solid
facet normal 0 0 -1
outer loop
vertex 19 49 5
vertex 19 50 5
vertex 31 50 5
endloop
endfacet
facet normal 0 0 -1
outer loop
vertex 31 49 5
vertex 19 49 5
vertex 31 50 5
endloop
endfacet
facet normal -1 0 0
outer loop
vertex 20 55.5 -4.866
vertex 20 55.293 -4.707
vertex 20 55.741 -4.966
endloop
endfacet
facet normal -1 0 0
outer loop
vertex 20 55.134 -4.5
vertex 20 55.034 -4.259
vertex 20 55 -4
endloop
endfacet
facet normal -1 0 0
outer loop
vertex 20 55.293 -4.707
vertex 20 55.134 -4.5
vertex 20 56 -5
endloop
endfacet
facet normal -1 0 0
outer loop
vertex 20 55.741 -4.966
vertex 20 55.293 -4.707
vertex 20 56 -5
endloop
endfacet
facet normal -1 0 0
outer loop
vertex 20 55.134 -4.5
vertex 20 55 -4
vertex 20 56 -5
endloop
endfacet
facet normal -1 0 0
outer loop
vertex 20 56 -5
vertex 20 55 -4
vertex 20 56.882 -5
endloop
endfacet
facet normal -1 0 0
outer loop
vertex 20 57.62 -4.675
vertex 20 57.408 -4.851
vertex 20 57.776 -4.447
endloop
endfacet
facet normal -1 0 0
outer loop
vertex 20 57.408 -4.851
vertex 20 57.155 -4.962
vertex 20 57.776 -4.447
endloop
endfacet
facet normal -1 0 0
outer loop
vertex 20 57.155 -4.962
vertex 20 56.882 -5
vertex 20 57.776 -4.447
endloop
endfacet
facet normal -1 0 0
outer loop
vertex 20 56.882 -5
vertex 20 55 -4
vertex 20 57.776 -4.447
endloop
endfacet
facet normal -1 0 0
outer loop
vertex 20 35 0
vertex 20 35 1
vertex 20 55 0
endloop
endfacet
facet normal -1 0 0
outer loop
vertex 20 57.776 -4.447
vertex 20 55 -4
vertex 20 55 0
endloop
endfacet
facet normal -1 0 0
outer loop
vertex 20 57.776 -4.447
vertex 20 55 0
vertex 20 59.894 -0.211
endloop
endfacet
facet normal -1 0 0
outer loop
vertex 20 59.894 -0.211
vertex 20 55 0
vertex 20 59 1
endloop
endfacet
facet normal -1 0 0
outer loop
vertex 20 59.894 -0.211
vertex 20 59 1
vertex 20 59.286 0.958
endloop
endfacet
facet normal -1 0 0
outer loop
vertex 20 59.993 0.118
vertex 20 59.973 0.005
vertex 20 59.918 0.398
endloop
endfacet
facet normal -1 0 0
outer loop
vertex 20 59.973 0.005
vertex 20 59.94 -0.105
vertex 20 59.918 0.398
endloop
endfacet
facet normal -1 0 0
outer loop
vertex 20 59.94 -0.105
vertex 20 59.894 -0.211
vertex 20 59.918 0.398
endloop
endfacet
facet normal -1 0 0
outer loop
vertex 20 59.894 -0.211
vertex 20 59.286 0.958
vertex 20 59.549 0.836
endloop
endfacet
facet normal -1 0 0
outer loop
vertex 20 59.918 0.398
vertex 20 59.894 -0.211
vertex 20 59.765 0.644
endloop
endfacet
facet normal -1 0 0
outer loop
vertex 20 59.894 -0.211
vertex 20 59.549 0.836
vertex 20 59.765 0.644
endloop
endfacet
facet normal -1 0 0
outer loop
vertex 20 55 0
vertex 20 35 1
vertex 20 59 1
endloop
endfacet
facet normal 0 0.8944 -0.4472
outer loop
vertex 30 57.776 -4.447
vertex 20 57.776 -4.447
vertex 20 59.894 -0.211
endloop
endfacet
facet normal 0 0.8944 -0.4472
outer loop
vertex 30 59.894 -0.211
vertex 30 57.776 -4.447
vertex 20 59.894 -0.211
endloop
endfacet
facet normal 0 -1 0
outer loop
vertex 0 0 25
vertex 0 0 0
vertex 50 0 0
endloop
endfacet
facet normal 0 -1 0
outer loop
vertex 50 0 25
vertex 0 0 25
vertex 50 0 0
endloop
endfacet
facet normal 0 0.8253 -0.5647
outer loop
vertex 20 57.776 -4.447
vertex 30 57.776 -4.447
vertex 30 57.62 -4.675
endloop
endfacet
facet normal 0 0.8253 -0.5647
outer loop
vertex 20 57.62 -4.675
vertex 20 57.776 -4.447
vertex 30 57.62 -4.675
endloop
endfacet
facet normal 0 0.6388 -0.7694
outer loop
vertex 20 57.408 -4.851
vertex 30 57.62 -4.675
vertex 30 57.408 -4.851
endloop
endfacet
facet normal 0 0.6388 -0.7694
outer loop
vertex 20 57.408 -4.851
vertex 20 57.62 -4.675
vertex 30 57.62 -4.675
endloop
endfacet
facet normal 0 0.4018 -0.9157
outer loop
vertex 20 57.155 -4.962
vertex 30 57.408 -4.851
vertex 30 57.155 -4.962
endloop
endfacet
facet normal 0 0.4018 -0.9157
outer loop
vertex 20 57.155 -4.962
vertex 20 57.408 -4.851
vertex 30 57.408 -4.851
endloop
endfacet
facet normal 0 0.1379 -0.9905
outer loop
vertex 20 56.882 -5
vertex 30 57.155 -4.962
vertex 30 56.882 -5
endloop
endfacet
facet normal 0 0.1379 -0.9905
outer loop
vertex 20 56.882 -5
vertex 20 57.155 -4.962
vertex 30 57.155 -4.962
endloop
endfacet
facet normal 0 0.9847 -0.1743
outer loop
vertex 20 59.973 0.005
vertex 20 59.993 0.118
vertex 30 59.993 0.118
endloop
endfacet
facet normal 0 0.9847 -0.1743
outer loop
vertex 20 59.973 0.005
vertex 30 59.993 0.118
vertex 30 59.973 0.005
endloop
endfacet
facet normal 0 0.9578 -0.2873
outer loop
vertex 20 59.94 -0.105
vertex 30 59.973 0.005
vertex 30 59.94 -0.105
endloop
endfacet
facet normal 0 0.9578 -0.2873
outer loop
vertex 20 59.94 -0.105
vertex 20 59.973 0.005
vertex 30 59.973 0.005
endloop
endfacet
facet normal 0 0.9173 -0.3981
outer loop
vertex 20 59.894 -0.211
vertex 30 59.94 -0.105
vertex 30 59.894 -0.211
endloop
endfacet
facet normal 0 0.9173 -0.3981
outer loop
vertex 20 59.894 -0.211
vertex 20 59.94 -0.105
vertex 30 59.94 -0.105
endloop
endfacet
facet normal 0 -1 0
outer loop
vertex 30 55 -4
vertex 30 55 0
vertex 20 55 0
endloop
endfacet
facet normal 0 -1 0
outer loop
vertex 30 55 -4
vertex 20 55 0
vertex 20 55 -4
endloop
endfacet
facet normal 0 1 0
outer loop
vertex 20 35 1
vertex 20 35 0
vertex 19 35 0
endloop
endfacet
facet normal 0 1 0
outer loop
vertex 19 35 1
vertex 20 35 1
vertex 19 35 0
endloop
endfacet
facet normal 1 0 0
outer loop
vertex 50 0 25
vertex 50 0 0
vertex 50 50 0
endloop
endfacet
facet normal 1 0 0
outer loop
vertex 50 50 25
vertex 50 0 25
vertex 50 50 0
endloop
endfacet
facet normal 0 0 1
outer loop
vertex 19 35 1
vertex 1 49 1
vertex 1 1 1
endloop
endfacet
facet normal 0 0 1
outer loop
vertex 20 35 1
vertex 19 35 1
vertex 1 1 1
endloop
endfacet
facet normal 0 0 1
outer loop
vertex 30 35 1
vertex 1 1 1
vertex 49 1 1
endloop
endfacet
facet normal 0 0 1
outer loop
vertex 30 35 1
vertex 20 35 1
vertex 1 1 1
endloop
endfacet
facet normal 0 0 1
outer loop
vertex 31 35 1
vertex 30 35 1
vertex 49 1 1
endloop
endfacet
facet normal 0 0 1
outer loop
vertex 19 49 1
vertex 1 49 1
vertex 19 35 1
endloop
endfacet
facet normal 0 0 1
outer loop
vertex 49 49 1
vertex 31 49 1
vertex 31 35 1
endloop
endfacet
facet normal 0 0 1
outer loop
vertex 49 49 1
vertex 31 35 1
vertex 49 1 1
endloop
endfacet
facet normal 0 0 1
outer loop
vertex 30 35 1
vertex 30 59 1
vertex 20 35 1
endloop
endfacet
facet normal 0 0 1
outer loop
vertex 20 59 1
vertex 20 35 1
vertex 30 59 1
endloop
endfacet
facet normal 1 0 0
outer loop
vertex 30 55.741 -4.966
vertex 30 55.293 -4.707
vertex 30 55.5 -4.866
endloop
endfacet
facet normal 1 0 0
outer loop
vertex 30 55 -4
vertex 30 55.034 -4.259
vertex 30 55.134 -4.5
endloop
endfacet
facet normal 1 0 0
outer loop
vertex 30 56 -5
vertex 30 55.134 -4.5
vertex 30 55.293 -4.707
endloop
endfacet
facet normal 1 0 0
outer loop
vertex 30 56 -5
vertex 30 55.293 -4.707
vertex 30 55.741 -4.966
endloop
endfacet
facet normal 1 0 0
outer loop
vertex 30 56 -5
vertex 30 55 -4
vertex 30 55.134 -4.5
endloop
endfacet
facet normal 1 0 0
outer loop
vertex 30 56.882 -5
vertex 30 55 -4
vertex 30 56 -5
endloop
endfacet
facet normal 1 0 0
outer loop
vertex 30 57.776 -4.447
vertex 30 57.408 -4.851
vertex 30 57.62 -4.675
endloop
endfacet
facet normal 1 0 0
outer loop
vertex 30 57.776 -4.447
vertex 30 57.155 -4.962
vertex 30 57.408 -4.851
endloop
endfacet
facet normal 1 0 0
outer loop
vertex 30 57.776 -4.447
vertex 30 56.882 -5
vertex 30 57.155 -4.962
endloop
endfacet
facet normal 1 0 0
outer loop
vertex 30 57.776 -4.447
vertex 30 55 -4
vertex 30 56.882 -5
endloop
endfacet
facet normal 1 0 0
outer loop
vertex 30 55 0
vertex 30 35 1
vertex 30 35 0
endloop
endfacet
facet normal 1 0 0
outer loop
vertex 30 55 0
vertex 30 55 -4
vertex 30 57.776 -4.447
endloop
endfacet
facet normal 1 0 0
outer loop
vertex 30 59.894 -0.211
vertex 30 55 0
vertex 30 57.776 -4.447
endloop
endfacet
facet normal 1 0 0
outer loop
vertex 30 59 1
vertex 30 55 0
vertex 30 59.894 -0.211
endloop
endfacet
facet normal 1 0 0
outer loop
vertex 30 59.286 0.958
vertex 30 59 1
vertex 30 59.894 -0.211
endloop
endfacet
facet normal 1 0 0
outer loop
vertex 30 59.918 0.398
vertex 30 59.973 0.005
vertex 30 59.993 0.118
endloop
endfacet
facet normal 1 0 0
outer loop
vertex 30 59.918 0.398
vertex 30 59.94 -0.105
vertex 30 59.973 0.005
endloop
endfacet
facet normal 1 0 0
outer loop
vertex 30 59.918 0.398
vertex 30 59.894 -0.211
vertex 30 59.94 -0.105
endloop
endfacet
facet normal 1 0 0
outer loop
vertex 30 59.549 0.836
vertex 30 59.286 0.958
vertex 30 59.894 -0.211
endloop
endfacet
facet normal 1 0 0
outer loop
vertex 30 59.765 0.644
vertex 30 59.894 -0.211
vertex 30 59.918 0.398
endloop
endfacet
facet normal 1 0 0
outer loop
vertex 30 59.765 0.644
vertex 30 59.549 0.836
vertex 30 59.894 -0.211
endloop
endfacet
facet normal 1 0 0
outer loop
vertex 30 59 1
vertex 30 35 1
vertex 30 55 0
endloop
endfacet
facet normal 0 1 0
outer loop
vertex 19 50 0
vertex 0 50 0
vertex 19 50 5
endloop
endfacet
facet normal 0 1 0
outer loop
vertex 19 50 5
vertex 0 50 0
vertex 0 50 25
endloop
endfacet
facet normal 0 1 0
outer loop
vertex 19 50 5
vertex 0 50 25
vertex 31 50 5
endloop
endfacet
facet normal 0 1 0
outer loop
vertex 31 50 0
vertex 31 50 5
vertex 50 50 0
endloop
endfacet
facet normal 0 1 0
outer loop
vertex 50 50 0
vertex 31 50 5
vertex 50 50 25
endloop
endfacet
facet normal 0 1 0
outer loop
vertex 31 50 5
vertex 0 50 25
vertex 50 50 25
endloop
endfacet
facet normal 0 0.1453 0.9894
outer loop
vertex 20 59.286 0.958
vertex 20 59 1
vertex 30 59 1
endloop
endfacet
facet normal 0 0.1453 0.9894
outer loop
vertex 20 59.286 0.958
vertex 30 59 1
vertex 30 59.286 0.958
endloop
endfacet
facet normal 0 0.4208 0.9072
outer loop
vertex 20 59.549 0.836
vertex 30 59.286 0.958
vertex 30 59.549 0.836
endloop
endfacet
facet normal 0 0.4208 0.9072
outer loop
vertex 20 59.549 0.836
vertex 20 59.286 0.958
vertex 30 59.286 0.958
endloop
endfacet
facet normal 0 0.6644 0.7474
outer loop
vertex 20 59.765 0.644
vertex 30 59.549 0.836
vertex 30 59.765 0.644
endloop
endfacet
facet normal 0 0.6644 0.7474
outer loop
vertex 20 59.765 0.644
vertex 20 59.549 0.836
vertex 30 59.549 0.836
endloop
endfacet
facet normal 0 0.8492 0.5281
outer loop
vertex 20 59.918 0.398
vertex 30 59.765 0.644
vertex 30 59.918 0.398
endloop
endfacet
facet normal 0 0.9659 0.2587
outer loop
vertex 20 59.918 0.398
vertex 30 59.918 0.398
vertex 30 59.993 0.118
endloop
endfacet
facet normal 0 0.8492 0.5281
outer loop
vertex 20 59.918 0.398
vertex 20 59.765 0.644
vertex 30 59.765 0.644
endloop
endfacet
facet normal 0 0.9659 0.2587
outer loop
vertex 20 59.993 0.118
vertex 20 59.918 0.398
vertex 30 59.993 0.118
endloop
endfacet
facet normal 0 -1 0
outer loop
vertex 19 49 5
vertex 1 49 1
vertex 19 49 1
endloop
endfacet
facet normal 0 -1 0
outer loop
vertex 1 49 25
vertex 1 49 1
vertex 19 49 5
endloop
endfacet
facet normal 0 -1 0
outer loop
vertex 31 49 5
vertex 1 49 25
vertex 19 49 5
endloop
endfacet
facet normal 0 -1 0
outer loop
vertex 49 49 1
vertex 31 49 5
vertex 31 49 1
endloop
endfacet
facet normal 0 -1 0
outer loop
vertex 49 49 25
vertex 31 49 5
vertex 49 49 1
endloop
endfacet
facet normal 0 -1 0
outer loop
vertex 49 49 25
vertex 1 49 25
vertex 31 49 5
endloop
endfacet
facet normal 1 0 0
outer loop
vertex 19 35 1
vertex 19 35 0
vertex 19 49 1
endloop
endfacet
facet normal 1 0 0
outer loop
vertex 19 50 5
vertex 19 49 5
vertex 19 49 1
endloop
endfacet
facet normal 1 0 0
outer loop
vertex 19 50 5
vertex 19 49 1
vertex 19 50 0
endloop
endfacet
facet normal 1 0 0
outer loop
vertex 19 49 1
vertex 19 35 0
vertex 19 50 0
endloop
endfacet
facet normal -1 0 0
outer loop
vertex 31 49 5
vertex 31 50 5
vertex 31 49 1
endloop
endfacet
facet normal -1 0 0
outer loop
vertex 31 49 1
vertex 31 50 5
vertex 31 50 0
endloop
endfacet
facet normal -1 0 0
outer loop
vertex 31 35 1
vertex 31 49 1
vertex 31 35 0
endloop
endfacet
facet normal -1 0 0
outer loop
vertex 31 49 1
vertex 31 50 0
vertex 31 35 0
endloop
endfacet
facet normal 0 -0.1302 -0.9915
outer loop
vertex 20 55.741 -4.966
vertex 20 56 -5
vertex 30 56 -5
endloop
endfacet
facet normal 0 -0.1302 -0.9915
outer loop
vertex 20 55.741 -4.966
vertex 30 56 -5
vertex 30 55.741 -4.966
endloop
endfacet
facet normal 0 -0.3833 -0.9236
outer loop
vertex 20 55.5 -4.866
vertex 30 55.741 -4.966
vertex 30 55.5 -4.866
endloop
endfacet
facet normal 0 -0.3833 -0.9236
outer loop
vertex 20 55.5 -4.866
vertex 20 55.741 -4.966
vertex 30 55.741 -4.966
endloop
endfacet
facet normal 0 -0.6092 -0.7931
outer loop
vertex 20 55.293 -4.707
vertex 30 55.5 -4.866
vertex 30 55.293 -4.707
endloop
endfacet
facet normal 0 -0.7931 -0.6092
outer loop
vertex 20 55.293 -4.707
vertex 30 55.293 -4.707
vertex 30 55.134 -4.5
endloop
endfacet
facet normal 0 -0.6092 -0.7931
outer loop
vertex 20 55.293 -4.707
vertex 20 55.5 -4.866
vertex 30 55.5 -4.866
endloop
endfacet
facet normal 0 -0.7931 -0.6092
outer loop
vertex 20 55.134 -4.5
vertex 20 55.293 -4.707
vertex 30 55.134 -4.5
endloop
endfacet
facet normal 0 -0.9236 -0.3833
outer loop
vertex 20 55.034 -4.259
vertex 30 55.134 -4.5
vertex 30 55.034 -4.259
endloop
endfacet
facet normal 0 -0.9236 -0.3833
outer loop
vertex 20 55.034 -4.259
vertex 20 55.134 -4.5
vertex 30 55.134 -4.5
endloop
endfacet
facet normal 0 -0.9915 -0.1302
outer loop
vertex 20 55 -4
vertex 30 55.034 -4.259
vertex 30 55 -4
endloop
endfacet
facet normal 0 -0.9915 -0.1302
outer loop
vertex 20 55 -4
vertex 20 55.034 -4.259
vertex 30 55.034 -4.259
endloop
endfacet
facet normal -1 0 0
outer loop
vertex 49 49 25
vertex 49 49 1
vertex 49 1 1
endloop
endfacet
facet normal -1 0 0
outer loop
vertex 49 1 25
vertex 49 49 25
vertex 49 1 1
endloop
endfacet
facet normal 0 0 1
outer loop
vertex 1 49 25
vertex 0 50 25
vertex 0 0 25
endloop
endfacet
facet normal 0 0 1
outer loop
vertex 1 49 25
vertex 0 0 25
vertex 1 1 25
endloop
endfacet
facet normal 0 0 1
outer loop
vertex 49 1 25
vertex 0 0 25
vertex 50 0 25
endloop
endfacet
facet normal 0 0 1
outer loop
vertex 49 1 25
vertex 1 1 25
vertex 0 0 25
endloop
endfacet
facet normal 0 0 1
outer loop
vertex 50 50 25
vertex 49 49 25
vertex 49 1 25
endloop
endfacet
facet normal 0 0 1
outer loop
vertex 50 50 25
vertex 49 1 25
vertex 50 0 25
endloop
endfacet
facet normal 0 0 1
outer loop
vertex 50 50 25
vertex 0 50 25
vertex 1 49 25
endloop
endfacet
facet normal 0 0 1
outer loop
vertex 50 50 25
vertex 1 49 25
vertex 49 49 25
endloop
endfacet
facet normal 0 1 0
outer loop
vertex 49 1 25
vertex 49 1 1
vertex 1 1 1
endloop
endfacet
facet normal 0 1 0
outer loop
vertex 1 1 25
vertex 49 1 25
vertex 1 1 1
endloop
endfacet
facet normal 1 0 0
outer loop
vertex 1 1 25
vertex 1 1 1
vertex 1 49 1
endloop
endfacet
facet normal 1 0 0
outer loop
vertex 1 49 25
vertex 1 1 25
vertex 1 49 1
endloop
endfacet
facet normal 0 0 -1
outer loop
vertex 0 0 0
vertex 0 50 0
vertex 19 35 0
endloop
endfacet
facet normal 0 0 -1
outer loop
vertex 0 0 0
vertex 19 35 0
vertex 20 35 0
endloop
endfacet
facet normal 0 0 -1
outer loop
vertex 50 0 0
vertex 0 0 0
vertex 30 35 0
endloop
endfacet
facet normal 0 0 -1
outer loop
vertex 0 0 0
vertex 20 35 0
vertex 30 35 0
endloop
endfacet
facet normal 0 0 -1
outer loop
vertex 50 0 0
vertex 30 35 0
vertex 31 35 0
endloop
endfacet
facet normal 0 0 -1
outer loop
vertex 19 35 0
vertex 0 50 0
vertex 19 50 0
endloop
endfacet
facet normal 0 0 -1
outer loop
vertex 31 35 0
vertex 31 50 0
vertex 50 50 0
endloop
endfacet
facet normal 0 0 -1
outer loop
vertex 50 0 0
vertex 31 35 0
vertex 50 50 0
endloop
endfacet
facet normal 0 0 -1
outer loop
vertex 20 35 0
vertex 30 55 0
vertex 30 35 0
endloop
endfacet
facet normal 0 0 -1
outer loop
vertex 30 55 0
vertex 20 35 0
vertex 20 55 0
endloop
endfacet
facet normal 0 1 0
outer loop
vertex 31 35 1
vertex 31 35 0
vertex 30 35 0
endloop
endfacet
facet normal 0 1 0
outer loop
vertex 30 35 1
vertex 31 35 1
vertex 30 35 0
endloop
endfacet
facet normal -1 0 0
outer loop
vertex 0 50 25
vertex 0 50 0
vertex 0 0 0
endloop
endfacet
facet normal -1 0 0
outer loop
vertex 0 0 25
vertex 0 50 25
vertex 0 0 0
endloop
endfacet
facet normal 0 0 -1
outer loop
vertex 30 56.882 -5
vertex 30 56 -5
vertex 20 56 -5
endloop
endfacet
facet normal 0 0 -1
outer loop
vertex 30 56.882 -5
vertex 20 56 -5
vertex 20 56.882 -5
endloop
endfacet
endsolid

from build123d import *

# Parameters (mm, degrees)
F1_DEPTH      = 1
F3_DEPTH      = 25
F6_DEPTH      = 5
F6_DEPTH_BACK = 5
F8_W          = 12
F8_H          = 1
F9_DEPTH      = 20
F10_T1_DEPTH  = 13.0901699437
F10_T3_DEPTH  = 15
F10_T5_DEPTH  = 11.1803398875


# Not quite as in the source:
# - a fillet or chamfer that OpenCascade refuses, or shapes differently, is made with other operations: its cross-section is extruded or revolved along the edge and cut away or added


with BuildPart() as f1:
    # F0 (on Top) → F1 (new body)
    with BuildSketch(Plane.XY):
        Polygon((0, 50), (0, 0), (50, 0), (50, 50), (31, 50), (31, 35), (30, 35), (30, 60), (20, 60), (20, 35), (19, 35), (19, 50), align=None)
    extrude(amount=F1_DEPTH)

    # F2 (on Top) → F3 (join)
    with BuildSketch(Plane.XY):
        Polygon((0, 50), (0, 0), (50, 0), (50, 50), (31, 50), (31, 49), (49, 49), (49, 1), (1, 1), (1, 49), (19, 49), (19, 50), align=None)
    extrude(amount=F3_DEPTH)

    # F5 (on offset) → F6 (join, two sides)
    with BuildSketch(Plane.YZ.offset(25)) as f6_sk:
        Polygon((57.5, -5), (60, 0), (55, 0), (55, -5), align=None)
    extrude(amount=F6_DEPTH)
    extrude(f6_sk.sketch, amount=-F6_DEPTH_BACK)

    # F8 (on offset) → F9 (join)
    with BuildSketch(Plane.XY.offset(25)):
        with Locations((25, 49.5)):
            Rectangle(F8_W, F8_H)
    extrude(amount=-F9_DEPTH)

    # F10: fillet of radius 1 on 4 edges, made by hand

    # F10_s2 → F10_t1 (cut)
    with BuildSketch(Plane.YZ.offset(18.4549150281)):
        with BuildLine():
            ThreePointArc((57.7763932023, -4.4472135955), (57.4076971234, -4.8506508084), (56.8819660113, -5))
            Line((56.8819660113, -5), (57.5, -5))
            Line((57.5, -5), (57.7763932023, -4.4472135955))
        make_face()
    extrude(amount=F10_T1_DEPTH, mode=Mode.SUBTRACT)

    # F10_s4 → F10_t3 (cut)
    with BuildSketch(Plane.YZ.offset(17.5)):
        with BuildLine():
            ThreePointArc((56, -5), (55.2928932188, -4.7071067812), (55, -4))
            Line((55, -4), (55, -5))
            Line((55, -5), (56, -5))
        make_face()
        with BuildLine():
            ThreePointArc((59, 1), (59.7071067812, 0.7071067812), (60, 0))
            Line((60, 0), (60, 1))
            Line((60, 1), (59, 1))
        make_face()
    extrude(amount=F10_T3_DEPTH, mode=Mode.SUBTRACT)

    # F10_s6 → F10_t5 (cut)
    with BuildSketch(Plane.YZ.offset(19.4098300563)):
        with BuildLine():
            ThreePointArc((60, 0.2360679775), (59.9732489895, 0.006315057), (59.894427191, -0.211145618))
            Line((59.894427191, -0.211145618), (60, 0))
            Line((60, 0), (60, 0.2360679775))
        make_face()
    extrude(amount=F10_T5_DEPTH, mode=Mode.SUBTRACT)


solid = f1.part
